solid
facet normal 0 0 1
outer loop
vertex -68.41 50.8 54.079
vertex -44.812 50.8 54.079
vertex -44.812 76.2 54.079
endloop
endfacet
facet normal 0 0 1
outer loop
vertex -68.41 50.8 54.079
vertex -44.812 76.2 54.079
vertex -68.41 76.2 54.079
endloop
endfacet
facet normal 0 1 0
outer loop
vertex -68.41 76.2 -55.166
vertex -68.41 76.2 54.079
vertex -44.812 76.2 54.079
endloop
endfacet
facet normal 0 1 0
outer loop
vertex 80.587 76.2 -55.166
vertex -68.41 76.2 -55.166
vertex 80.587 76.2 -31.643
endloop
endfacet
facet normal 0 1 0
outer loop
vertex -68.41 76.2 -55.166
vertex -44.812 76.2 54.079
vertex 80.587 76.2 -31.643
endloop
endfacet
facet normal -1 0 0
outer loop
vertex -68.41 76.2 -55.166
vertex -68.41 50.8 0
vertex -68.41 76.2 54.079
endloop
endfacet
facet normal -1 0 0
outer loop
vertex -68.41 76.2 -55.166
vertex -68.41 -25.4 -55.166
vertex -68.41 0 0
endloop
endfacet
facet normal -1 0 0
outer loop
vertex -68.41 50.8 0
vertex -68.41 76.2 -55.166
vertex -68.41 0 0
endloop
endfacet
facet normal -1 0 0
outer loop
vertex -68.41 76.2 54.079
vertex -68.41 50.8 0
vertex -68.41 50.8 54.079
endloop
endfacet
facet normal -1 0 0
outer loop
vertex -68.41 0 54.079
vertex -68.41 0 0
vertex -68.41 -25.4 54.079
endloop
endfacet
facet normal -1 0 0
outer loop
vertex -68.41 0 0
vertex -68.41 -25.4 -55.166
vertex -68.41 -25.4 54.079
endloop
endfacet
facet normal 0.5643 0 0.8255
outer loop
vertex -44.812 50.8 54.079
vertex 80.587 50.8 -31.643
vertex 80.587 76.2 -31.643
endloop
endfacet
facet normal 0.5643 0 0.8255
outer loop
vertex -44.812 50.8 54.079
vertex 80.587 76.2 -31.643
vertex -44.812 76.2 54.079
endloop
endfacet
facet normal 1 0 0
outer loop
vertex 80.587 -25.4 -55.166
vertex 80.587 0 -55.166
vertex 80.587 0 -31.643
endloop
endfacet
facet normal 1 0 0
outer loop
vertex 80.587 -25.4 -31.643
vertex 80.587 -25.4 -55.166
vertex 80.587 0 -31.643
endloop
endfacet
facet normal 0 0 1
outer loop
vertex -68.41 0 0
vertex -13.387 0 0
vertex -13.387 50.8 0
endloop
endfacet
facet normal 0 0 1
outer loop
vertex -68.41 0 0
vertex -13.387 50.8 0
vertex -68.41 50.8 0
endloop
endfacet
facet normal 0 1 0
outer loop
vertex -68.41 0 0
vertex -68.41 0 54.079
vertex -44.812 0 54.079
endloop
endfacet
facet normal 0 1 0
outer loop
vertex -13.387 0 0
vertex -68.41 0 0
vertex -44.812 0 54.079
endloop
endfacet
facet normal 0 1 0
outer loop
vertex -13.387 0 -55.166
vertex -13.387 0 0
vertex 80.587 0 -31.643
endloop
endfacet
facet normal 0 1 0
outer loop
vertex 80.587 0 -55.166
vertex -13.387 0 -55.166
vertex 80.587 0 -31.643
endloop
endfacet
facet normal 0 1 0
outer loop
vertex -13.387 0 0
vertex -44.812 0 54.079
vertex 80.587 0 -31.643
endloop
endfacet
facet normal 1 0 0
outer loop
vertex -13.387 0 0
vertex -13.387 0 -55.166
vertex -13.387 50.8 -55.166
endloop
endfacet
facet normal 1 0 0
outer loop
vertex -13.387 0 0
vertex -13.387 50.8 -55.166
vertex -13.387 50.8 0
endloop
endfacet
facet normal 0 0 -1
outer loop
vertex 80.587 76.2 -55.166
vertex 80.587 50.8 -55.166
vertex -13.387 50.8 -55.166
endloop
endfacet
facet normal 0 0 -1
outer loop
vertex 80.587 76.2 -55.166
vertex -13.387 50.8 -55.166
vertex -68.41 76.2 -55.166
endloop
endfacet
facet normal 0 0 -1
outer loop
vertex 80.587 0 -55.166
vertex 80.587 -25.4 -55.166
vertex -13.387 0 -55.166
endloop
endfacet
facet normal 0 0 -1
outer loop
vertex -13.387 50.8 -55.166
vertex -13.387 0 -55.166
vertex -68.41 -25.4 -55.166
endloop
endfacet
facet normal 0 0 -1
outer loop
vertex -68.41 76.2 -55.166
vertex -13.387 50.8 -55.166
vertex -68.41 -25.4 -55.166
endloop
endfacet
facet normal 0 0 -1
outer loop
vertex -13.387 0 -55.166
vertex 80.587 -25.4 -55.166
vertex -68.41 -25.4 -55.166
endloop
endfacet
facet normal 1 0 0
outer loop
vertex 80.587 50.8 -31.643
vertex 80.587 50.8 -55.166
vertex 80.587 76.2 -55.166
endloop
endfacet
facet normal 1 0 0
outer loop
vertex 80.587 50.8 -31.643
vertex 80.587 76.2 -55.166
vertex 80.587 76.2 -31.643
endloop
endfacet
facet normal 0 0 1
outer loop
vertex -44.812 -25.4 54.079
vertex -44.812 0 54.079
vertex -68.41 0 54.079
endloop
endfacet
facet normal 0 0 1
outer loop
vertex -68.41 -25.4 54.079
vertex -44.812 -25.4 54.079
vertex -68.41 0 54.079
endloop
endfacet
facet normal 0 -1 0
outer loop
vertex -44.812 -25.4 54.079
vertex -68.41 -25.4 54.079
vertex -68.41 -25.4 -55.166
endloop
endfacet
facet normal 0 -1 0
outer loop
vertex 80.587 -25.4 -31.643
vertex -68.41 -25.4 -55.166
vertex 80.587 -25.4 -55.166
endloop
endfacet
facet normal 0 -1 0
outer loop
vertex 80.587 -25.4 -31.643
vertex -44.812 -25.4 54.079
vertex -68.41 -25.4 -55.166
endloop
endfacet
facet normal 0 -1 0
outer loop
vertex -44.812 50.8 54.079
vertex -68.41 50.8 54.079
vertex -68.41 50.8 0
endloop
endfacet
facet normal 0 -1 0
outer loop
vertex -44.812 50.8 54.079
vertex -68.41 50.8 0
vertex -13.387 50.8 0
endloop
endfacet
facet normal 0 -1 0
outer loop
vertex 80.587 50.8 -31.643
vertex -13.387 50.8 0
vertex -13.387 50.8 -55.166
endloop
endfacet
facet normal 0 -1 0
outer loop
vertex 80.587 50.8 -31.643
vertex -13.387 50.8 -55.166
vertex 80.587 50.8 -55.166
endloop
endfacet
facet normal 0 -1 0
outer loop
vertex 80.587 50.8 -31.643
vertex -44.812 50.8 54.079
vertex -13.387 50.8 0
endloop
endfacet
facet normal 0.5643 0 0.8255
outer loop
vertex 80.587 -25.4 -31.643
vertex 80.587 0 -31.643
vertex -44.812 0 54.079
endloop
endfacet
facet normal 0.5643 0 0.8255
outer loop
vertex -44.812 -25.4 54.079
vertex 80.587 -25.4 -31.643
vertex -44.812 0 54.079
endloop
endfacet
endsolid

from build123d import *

# Parameters (mm, degrees)
F1_DEPTH = 25.4
F4_W     = 55.0225842744
F4_H     = 55.1656335513
F5_DEPTH = 50.8


with BuildPart() as f1:
    # F0 (on Front) → F1 (new body)
    with BuildSketch(Plane.XZ):
        Polygon((-68.4096906334, 54.0788695137), (-68.4096906334, -55.1656335513), (80.5874373764, -55.1656335513), (80.5874373764, -31.6427350123), (-44.8120329529, 54.0788695137), align=None)
    extrude(amount=F1_DEPTH)


with BuildPart() as f3_1:
    # F3: instance of F1
    add(f1.part.mirror(Plane.XZ.offset(-25.4)))


with BuildPart() as f1_1:
    add(f1.part)

    add(f3_1.part)  # F5 merges F3_1
    # F4 (on face) → F5 (join, through all)
    with BuildSketch(Plane(origin=(0, 0, 0), x_dir=(-1, 0, 0), z_dir=(0, 1, 0))):
        with Locations((40.8983984962, -27.5828167757)):
            Rectangle(F4_W, F4_H)
    extrude(amount=F5_DEPTH)


solid = f1_1.part
